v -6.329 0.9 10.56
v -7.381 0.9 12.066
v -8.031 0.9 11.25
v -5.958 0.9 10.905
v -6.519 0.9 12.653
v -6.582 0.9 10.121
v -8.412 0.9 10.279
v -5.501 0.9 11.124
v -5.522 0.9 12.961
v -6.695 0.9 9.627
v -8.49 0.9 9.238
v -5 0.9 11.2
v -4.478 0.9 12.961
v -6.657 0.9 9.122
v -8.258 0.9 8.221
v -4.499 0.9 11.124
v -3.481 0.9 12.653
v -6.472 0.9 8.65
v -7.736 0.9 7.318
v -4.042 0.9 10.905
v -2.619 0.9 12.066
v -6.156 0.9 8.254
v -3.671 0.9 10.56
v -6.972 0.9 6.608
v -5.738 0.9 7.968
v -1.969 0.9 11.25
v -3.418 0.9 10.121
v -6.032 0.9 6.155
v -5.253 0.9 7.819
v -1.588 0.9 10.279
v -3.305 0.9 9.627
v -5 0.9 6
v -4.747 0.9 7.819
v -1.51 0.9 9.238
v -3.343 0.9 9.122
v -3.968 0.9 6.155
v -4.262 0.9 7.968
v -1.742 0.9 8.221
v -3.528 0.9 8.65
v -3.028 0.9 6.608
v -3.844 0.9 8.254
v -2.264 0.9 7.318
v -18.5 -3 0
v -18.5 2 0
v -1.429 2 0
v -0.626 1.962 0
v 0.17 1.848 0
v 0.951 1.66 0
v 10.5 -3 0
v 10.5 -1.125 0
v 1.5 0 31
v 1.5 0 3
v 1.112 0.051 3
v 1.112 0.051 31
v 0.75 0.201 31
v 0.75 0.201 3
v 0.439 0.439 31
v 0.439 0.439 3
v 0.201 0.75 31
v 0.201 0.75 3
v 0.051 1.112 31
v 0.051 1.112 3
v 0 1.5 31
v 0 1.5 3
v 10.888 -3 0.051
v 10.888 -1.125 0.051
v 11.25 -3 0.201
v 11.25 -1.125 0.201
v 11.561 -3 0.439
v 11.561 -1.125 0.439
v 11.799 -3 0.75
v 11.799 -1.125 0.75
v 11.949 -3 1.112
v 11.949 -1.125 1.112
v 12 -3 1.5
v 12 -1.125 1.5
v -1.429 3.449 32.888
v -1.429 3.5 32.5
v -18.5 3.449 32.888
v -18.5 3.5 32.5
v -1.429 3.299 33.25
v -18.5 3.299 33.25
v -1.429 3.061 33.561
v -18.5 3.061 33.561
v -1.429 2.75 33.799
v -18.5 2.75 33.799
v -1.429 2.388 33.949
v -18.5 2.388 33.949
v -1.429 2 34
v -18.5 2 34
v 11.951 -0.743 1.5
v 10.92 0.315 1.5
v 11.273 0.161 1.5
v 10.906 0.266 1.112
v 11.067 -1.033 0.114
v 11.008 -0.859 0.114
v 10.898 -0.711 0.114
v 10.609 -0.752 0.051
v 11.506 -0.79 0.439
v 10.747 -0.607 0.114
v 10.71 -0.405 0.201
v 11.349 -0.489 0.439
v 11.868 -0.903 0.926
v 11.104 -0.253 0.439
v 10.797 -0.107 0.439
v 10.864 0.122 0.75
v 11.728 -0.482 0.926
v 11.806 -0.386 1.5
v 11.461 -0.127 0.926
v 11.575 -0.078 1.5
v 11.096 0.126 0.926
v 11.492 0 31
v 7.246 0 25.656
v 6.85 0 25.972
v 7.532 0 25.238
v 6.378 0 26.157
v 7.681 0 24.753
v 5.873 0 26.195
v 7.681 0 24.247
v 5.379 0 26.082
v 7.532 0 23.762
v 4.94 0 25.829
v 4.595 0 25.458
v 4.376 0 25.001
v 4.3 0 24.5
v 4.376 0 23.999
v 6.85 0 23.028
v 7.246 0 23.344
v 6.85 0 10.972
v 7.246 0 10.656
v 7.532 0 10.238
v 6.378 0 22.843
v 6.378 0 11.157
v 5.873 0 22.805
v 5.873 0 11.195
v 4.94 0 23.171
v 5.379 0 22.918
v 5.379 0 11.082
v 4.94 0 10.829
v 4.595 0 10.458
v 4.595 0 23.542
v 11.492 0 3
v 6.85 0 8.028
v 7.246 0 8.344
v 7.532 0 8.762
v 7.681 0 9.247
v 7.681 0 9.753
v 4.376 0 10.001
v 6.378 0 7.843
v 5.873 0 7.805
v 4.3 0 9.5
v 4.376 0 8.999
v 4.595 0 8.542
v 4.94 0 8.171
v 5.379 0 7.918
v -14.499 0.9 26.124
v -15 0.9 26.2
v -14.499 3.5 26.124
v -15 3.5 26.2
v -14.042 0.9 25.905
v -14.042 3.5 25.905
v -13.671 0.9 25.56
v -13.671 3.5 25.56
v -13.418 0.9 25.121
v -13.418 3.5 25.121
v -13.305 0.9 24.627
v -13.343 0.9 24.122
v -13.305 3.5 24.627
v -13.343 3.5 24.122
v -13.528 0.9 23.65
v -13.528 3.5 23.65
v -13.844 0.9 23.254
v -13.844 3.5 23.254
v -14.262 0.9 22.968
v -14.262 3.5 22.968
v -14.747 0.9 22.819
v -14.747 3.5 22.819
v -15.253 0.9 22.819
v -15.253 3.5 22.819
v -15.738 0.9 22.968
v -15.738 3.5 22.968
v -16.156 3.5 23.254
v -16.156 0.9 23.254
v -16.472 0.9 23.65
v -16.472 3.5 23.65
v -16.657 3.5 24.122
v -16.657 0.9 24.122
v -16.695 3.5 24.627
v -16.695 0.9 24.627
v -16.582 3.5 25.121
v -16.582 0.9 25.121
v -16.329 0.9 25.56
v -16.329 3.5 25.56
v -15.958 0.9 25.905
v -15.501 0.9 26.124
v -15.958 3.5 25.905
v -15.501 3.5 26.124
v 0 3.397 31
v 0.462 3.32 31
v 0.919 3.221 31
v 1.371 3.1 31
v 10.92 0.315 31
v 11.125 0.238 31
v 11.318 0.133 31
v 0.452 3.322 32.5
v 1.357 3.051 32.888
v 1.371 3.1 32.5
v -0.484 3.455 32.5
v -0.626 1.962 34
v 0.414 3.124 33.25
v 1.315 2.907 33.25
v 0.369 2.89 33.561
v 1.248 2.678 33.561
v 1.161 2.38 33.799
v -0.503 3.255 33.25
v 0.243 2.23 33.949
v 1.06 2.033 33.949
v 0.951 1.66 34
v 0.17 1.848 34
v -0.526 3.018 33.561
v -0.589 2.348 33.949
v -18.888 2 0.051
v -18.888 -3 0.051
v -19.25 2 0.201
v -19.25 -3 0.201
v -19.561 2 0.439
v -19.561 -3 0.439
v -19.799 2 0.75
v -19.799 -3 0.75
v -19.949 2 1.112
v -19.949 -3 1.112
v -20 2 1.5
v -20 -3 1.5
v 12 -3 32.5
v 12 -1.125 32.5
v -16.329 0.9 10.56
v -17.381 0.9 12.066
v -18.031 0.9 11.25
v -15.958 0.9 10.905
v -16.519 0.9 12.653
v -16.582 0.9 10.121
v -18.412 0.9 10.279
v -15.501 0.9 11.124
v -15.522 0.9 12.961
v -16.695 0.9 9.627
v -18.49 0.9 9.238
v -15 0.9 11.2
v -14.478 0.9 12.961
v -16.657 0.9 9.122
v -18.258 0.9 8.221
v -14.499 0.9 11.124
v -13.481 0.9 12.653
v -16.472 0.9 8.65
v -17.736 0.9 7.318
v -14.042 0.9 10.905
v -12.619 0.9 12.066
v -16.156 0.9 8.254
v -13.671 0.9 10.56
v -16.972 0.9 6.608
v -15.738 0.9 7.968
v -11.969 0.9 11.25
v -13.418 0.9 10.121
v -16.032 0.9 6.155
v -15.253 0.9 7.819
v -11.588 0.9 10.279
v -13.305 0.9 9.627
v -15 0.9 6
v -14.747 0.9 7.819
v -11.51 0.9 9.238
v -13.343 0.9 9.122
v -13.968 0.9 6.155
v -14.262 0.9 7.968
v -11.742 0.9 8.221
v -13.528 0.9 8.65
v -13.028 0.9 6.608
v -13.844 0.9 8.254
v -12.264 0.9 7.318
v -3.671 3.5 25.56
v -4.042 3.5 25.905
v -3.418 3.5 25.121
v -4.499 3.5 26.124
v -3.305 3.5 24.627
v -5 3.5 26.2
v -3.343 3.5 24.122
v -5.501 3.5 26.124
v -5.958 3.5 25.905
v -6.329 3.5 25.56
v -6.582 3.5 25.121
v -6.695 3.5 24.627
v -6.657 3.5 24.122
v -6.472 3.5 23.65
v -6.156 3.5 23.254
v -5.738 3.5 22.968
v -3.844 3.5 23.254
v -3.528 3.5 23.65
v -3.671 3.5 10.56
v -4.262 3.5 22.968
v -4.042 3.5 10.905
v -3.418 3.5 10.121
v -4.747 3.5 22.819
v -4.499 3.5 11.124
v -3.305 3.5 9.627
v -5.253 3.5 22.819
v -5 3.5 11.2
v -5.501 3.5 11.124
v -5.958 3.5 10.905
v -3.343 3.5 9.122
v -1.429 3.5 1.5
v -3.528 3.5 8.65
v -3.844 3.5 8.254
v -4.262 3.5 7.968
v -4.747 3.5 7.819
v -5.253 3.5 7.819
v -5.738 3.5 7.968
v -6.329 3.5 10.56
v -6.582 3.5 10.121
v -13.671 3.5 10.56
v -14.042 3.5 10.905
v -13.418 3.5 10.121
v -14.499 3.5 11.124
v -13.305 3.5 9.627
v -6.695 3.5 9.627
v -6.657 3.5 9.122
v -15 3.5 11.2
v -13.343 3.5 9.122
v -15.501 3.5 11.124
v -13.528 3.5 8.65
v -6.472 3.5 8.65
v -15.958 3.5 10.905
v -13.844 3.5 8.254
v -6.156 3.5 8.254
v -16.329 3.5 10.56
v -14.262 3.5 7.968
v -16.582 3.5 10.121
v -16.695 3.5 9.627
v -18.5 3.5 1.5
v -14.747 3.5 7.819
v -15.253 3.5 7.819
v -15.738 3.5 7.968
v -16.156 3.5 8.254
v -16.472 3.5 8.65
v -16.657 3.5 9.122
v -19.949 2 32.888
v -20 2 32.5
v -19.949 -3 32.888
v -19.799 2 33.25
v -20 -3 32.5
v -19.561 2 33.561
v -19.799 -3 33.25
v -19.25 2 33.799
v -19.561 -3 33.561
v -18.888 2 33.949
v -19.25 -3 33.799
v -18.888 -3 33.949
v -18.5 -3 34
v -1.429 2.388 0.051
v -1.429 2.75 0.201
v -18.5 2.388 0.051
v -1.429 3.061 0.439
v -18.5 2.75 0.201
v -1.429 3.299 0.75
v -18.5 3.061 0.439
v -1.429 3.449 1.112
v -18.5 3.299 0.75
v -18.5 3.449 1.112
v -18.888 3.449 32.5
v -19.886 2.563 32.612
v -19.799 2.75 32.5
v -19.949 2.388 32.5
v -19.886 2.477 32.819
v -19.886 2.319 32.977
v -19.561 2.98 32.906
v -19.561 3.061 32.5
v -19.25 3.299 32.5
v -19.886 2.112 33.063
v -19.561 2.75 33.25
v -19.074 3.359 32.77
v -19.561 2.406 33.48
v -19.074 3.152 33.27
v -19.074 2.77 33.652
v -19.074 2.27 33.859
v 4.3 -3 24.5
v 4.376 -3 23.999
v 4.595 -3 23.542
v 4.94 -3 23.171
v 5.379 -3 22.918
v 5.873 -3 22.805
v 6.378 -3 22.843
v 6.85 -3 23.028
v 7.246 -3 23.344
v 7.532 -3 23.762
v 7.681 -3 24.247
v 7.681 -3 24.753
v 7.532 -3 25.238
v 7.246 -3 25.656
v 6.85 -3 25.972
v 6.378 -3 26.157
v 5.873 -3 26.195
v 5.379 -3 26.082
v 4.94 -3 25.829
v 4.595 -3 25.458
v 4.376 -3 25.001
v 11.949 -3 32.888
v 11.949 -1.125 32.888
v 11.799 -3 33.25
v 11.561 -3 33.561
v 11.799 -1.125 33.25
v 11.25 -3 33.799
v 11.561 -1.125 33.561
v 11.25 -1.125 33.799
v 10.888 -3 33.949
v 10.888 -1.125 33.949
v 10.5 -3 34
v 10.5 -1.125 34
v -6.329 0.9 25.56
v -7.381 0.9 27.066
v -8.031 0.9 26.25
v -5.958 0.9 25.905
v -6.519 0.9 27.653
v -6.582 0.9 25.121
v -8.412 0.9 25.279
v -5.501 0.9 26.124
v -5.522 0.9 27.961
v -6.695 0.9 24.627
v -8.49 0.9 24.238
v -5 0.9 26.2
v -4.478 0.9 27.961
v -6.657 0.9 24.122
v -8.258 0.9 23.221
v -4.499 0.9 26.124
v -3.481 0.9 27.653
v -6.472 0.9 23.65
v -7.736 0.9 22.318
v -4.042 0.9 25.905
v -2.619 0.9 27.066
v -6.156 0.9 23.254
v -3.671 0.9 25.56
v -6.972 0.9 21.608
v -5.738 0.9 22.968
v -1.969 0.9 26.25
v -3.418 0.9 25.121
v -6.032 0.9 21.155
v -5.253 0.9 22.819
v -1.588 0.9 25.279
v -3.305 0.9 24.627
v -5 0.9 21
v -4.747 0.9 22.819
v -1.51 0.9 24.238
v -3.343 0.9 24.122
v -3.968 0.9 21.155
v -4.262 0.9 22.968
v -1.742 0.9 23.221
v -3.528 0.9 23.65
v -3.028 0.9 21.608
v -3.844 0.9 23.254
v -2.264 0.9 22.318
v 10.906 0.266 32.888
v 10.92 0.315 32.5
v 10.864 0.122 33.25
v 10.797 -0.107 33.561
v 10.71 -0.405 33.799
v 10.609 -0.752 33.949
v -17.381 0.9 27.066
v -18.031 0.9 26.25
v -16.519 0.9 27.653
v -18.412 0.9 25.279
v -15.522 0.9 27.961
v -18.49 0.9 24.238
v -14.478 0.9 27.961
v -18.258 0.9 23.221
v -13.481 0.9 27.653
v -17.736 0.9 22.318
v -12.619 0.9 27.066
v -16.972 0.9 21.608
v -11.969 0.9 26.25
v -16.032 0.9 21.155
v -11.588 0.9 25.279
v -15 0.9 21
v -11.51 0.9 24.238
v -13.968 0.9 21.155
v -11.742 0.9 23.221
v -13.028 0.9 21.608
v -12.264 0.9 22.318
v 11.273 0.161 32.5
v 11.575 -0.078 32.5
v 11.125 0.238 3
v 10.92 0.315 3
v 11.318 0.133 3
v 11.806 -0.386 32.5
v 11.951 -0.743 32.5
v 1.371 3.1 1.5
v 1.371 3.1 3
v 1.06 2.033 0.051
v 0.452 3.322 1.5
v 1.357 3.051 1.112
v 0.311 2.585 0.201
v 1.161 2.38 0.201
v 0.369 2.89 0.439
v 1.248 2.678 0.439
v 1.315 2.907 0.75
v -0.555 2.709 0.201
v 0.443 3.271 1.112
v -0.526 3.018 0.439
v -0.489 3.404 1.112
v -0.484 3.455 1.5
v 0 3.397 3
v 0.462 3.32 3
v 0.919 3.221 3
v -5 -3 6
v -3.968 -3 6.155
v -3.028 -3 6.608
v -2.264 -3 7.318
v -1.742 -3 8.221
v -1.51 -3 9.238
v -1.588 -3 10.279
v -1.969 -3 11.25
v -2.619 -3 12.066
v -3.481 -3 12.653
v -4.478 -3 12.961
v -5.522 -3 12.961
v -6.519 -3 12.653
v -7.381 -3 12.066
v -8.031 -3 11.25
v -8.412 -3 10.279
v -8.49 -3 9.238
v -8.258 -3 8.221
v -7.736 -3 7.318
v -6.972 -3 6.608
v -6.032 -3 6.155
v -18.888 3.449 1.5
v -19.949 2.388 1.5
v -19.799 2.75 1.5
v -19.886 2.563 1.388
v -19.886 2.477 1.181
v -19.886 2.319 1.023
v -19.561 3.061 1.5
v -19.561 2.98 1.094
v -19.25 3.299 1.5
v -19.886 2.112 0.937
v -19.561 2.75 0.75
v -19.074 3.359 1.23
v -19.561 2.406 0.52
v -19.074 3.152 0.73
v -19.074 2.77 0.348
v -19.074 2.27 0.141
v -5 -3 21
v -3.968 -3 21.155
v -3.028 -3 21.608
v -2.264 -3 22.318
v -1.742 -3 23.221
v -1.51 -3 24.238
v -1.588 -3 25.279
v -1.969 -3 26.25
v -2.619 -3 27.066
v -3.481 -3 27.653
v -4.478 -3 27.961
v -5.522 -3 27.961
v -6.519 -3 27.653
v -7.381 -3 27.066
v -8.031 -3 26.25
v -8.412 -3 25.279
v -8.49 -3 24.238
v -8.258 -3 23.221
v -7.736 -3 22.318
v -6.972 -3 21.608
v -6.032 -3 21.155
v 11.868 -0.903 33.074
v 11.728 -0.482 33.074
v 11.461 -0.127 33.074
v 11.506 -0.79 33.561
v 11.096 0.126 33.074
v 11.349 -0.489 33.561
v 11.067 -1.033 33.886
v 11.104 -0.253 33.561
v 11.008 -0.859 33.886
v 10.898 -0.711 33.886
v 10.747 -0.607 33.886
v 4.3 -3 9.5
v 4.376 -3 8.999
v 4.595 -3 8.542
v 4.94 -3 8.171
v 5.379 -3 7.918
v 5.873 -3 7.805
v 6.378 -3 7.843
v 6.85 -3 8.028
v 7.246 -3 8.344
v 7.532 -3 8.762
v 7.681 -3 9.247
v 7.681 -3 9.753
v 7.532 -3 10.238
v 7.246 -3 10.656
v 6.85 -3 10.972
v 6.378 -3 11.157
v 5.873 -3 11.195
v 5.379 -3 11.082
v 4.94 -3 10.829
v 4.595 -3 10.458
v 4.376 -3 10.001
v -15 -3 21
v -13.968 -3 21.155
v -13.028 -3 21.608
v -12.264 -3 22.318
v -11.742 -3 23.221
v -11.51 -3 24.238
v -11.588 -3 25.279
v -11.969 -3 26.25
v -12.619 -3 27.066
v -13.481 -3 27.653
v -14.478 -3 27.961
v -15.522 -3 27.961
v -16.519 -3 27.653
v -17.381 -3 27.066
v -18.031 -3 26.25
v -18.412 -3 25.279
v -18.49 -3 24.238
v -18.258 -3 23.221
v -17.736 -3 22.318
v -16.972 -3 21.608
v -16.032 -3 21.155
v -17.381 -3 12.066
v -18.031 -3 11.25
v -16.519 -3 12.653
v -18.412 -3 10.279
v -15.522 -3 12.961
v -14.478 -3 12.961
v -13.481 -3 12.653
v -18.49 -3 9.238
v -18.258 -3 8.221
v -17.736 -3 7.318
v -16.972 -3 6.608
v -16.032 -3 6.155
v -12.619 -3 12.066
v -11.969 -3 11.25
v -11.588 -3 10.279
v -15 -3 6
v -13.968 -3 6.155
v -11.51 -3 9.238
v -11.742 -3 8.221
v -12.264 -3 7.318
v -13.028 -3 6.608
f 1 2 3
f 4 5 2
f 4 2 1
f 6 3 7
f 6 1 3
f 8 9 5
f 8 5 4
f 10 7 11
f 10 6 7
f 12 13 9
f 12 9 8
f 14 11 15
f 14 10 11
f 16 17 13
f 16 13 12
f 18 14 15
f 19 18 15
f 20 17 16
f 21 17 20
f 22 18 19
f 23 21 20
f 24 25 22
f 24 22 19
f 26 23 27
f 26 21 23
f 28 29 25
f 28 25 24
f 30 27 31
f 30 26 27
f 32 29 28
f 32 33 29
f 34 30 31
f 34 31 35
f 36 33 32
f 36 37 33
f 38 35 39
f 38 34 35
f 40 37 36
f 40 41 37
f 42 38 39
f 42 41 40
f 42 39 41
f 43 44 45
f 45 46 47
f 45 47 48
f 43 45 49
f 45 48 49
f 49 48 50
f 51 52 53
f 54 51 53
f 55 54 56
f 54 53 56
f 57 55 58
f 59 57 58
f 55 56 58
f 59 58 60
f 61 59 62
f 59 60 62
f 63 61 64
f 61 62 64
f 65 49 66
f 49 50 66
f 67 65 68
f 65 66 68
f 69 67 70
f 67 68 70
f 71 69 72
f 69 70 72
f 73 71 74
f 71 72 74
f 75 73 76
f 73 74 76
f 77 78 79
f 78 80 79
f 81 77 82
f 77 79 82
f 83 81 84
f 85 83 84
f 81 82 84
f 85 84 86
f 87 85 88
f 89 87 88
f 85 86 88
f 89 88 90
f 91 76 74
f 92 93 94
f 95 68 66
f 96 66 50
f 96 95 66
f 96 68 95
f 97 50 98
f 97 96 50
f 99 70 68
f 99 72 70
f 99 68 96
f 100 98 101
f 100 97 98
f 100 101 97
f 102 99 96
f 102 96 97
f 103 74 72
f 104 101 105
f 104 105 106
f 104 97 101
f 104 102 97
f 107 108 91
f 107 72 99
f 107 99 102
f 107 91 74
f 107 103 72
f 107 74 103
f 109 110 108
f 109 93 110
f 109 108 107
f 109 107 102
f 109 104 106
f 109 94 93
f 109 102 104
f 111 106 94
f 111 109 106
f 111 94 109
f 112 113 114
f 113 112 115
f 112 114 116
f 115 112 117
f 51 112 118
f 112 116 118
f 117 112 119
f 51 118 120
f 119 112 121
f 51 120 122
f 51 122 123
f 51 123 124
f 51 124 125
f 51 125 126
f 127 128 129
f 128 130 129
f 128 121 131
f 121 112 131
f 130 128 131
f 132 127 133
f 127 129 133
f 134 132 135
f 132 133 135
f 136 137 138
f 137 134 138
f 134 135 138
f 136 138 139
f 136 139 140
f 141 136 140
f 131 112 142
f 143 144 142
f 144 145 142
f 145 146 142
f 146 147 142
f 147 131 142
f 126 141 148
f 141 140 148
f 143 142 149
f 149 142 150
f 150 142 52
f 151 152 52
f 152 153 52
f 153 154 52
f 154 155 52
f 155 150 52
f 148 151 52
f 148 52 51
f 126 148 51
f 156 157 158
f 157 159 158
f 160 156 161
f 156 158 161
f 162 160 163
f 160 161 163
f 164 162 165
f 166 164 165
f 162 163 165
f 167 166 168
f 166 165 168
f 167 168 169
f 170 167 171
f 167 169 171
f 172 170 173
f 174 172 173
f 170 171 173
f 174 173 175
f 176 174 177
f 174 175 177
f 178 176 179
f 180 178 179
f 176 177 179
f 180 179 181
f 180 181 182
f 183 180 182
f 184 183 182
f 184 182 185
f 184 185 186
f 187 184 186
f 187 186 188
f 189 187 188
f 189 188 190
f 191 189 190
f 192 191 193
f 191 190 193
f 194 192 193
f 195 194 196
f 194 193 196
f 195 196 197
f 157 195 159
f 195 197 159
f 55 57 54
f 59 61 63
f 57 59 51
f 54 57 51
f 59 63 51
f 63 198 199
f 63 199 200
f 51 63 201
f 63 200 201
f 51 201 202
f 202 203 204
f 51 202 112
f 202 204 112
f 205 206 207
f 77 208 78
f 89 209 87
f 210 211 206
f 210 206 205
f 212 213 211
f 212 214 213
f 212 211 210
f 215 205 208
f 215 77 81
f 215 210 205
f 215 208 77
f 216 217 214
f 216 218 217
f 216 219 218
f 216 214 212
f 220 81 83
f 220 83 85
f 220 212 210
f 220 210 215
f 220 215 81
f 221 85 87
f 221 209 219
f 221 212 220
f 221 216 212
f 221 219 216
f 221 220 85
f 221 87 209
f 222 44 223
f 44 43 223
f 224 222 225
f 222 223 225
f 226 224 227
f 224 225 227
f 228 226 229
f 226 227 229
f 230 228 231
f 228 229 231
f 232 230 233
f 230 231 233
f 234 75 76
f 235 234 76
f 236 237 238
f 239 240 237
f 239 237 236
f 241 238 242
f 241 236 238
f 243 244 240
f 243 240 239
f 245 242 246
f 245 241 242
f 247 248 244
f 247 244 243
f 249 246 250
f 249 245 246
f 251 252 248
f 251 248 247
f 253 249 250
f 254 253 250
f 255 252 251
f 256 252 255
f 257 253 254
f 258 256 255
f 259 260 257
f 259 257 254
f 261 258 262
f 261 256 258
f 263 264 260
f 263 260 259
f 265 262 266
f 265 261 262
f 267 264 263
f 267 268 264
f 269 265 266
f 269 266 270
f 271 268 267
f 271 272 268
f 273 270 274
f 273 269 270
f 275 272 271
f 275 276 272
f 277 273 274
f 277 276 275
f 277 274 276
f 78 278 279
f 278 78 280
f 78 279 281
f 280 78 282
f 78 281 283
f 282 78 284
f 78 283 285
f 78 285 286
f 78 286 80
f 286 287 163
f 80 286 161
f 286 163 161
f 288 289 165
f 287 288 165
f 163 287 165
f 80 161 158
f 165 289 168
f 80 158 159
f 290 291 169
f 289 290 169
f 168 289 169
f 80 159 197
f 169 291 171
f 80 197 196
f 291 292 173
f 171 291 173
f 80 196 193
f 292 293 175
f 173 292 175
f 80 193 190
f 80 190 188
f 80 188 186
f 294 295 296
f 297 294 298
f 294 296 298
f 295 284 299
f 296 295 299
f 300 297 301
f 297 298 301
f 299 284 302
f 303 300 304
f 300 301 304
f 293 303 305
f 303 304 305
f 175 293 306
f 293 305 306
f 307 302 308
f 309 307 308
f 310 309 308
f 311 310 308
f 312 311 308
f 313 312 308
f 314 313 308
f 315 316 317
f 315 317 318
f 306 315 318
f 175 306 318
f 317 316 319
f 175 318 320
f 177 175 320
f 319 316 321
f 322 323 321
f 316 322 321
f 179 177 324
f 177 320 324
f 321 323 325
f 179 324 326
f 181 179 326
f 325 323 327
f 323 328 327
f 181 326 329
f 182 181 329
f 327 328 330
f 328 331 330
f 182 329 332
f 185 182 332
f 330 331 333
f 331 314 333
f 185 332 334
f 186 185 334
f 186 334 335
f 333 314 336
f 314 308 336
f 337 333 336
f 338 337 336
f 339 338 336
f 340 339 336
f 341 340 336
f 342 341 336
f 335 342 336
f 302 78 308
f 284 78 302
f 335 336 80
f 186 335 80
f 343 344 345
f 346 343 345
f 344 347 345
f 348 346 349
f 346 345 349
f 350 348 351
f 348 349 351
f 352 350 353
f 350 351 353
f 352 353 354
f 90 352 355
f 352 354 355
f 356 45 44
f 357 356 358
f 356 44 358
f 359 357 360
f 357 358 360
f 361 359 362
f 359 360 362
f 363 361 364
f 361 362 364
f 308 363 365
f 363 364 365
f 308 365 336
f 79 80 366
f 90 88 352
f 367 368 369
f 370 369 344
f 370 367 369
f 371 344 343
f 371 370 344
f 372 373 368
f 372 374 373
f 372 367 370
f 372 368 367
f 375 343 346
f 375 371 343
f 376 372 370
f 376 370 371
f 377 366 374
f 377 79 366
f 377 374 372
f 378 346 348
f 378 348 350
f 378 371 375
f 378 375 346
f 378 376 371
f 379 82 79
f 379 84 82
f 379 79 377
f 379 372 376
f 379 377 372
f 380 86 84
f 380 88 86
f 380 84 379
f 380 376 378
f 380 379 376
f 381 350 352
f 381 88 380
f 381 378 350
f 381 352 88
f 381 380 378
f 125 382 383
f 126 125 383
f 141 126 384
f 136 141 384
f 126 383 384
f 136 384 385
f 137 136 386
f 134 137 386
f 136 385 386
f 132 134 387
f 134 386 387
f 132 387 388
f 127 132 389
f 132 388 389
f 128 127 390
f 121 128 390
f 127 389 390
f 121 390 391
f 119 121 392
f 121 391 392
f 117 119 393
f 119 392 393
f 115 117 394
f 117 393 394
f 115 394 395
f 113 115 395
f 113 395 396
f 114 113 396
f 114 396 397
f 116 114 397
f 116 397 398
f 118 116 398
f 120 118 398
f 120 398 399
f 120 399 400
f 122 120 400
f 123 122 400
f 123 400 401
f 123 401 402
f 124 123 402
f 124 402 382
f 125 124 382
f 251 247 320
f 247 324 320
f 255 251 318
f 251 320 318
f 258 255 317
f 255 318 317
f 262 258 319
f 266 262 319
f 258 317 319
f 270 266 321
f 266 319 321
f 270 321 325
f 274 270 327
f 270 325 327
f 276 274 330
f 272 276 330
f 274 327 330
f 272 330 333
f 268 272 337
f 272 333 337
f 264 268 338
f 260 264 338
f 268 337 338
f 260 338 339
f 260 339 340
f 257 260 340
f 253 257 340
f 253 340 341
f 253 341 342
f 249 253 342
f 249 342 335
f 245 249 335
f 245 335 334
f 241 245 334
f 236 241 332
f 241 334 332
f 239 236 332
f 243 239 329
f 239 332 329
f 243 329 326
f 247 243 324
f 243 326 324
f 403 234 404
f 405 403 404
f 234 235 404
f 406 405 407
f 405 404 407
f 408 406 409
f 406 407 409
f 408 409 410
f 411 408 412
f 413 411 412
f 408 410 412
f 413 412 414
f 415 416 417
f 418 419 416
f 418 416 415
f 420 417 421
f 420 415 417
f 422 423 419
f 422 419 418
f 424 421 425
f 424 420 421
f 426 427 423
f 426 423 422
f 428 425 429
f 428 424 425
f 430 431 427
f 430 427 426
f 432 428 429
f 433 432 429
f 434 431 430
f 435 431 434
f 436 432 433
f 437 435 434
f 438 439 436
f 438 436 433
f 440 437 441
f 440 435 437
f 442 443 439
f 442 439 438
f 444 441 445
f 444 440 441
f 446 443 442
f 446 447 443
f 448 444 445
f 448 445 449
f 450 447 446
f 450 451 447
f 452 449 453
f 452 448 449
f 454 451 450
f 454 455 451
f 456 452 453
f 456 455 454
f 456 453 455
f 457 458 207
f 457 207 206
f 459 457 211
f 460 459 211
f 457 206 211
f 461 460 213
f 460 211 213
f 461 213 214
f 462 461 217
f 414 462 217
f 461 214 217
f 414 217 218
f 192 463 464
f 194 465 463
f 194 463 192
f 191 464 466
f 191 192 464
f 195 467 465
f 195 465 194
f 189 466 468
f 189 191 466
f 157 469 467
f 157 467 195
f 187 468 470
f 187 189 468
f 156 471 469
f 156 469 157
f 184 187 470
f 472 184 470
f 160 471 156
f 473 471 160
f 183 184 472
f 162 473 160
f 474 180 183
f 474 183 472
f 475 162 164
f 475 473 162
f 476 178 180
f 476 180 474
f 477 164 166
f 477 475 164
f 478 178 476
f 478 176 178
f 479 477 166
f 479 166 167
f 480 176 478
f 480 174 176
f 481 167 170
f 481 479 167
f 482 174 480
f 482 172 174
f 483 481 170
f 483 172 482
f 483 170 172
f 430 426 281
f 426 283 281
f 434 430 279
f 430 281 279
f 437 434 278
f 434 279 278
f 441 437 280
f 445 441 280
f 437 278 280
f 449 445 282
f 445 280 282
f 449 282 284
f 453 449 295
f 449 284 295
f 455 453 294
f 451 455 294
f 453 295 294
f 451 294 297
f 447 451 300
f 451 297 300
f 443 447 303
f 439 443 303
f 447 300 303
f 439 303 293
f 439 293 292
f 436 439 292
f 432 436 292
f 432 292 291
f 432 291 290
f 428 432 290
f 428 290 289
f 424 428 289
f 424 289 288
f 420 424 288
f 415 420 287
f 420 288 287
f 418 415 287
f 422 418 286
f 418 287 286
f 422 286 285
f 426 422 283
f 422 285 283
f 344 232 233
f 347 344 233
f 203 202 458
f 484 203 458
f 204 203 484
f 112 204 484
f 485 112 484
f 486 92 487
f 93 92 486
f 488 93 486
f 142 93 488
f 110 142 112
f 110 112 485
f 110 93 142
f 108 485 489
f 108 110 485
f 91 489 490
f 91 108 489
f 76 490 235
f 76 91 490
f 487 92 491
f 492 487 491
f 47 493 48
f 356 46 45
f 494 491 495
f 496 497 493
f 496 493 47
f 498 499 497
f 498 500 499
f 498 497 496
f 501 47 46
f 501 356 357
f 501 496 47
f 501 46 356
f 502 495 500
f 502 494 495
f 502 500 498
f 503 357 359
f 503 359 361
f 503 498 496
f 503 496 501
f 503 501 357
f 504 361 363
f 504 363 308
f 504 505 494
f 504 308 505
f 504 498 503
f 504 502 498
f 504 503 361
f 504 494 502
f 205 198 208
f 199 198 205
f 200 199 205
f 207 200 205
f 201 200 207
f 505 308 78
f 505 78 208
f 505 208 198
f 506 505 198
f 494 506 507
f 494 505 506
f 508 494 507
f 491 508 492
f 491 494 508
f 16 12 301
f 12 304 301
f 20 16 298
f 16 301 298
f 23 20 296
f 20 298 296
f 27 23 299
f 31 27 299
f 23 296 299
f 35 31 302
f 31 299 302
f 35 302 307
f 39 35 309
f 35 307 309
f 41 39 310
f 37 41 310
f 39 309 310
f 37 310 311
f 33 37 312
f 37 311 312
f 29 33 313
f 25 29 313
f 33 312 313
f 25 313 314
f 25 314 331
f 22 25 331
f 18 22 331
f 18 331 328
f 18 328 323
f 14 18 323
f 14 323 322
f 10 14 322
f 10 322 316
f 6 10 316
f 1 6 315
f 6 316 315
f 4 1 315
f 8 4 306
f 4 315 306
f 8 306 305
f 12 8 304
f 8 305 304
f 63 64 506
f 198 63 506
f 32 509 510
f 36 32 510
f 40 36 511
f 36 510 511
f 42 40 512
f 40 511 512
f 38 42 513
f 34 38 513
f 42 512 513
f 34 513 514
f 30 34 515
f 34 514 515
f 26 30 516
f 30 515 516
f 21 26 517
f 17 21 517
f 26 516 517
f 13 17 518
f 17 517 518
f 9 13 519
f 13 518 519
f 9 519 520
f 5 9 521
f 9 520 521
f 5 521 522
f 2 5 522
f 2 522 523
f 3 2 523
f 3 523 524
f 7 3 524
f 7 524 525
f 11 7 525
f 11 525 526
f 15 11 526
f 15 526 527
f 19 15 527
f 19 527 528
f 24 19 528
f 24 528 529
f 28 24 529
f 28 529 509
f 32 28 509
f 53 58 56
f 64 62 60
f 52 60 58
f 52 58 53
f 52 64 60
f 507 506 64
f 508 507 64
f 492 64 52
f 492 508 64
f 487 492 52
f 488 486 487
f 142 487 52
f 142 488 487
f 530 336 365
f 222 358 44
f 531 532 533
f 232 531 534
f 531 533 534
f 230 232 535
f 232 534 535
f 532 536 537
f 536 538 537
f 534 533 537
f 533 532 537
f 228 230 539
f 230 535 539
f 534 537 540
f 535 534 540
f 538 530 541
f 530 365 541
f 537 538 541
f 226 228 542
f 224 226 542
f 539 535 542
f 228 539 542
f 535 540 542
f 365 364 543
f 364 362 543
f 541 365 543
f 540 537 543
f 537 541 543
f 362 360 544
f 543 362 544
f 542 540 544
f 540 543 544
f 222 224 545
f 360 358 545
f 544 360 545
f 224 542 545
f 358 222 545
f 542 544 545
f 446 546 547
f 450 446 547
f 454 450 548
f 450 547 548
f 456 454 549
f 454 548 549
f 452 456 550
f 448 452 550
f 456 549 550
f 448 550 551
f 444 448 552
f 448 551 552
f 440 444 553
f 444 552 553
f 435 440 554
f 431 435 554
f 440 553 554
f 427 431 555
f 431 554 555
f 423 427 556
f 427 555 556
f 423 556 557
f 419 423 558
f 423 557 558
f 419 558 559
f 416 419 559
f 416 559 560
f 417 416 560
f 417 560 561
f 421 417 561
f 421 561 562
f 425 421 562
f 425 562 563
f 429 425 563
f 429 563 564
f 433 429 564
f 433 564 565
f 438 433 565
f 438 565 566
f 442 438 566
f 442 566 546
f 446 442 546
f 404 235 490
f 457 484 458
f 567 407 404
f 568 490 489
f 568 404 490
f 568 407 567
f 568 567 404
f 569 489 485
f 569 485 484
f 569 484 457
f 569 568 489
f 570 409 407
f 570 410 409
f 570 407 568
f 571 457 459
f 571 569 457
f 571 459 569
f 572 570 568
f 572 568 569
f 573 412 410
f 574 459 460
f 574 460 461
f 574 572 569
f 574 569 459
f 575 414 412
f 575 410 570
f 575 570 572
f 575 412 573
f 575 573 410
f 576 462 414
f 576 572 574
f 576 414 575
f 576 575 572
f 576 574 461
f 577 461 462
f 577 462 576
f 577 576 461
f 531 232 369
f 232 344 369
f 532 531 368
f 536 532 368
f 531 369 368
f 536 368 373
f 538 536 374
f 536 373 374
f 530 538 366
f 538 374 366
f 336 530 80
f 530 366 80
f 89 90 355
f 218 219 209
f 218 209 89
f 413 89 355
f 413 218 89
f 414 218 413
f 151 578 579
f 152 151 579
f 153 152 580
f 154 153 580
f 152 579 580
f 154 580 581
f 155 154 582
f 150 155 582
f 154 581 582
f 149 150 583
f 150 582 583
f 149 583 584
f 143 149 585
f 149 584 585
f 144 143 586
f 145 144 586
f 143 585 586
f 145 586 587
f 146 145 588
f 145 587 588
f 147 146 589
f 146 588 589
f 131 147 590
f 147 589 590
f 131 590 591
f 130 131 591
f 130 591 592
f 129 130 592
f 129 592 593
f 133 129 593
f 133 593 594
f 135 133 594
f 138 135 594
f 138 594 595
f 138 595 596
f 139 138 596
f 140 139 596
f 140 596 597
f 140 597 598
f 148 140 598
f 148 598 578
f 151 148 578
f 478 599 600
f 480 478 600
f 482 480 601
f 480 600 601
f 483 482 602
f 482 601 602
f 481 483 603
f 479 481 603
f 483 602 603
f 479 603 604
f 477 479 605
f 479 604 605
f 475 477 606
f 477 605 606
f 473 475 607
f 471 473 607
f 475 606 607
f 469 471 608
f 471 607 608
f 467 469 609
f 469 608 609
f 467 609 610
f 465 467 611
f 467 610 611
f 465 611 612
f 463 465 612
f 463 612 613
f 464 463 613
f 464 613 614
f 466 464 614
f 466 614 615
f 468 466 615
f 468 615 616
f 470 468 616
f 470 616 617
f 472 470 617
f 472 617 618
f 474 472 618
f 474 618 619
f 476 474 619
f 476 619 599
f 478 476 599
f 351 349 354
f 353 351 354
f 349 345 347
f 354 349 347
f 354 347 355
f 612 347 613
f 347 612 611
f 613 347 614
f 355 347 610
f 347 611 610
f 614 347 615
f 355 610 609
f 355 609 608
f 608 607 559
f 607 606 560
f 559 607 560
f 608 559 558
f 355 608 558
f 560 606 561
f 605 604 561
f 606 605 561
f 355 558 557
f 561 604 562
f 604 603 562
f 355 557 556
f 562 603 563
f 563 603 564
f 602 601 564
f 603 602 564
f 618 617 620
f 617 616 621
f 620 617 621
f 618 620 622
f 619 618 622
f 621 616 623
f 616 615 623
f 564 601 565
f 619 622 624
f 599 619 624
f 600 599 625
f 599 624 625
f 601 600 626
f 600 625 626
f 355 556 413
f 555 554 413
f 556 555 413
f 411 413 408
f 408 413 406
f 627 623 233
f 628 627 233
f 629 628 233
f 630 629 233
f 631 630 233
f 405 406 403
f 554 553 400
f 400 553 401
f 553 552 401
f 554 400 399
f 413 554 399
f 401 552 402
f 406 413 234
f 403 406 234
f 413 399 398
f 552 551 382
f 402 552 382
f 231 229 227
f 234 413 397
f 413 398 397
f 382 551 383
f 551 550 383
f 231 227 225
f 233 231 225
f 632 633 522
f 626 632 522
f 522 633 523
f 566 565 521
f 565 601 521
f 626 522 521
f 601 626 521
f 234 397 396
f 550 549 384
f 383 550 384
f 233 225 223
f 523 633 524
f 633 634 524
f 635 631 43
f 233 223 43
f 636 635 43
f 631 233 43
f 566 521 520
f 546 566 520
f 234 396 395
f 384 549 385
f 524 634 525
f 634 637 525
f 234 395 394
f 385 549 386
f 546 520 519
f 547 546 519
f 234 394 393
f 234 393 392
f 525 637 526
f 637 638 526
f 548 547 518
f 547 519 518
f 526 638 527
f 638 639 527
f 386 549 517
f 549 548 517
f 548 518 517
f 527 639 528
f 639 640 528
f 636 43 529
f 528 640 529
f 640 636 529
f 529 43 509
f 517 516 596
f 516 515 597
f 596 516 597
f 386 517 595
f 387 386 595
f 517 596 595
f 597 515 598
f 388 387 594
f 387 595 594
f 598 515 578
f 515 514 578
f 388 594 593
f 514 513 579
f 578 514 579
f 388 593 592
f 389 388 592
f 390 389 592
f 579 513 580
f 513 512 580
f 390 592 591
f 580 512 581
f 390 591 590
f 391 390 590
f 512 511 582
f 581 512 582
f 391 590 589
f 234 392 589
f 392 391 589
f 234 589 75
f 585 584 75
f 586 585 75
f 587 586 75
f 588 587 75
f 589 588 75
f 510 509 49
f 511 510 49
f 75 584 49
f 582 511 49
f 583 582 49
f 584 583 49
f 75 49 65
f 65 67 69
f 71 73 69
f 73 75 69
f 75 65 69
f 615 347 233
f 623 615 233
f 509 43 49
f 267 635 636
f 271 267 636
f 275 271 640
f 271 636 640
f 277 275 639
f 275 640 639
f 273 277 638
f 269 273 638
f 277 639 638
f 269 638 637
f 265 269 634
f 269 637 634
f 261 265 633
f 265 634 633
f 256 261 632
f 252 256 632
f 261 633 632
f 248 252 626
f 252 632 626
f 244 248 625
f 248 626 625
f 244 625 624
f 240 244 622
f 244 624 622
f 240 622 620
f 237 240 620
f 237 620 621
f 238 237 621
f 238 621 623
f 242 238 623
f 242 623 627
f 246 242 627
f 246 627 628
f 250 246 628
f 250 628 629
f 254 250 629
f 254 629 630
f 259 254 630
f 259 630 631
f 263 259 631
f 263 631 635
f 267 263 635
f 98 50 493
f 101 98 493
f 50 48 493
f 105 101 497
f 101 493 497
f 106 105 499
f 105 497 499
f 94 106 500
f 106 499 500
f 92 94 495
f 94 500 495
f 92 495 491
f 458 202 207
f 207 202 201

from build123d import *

# Parameters (mm, degrees)
PROFILE_EXTRUDE_DEPTH               = 34
GUSSET_1_EXTRUDE_DEPTH              = 3
GUSSET_START                        = 31
GUSSET_2_EXTRUDE_DEPTH              = 3
SOLENOID_MOUNTING_HOLES_D           = 3.4
SOLENOID_MOUNTING_HOLES_CBORE_D     = 7
SOLENOID_MOUNTING_HOLES_CBORE_DEPTH = 3.9
M3_MOUNTING_HOLES_D                 = 3.4
FRONT_START                         = -1
FRONT_EDGE_FILLETS_DEPTH            = 36
FRONT_EDGE_FILLETS_2_DEPTH          = 34
TOP_START                           = -1
TOP_EDGE_FILLET_DEPTH               = 36
CORNER_FILLETS_R                    = 1.5


with BuildPart() as part:
    # Profile Sketch → Profile  Extrude (new body)
    with BuildSketch(Plane.XY):
        Polygon((0, 0), (0, 3.5), (-20, 3.5), (-20, -3), (12, -3), (12, 0), align=None)
    extrude(amount=PROFILE_EXTRUDE_DEPTH)

    # Gusset Sketch → Gusset 1 Extrude (add)
    with BuildSketch(Plane.XY):
        Polygon((0, 0), (12, 0), (0, 3.5), align=None)
    extrude(amount=GUSSET_1_EXTRUDE_DEPTH)

    # Gusset Sketch<2> → Gusset 2 Extrude (add)
    with BuildSketch(Plane.XY.offset(GUSSET_START)):
        Polygon((0, 0), (12, 0), (0, 3.5), align=None)
    extrude(amount=GUSSET_2_EXTRUDE_DEPTH)

    # Solenoid Mounting Holes (through all)
    with Locations(Plane(origin=(-3, -3, 0), x_dir=(0, 0, -1), z_dir=(0, -1, 0))):
        with Locations((-9.5, -12), (-24.5, -12), (-24.5, -2), (-9.5, -2)):
            CounterBoreHole(SOLENOID_MOUNTING_HOLES_D / 2, SOLENOID_MOUNTING_HOLES_CBORE_D / 2, SOLENOID_MOUNTING_HOLES_CBORE_DEPTH)

    # M3 Mounting Holes (through all)
    with Locations(Plane(origin=(0, 0, 0), x_dir=(1, 0, 0), z_dir=(0, 1, 0))):
        with Locations((6, -24.5), (6, -9.5)):
            Hole(M3_MOUNTING_HOLES_D / 2)

    # Front Edge Fillets: read off the stored shape, not the designer's step
    # Front Edge Fillets outline → Front Edge Fillets (cut)
    with BuildSketch(Plane.XY.offset(FRONT_START)):
        with BuildLine():
            Line((12, -1.125), (12, 0))
            Line((12, 0), (10.92, 0.315))
            ThreePointArc((10.92, 0.315), (11.7, -0.225), (12, -1.125))
        make_face()
    extrude(amount=FRONT_EDGE_FILLETS_DEPTH, mode=Mode.SUBTRACT)

    # Front Edge Fillets 2 outline → Front Edge Fillets 2 (add)
    with BuildSketch(Plane.XY):
        with BuildLine():
            ThreePointArc((1.5, 0), (0.439339828, 0.439339828), (0, 1.5))
            Line((0, 1.5), (0, 0))
            Line((0, 0), (1.5, 0))
        make_face()
    extrude(amount=FRONT_EDGE_FILLETS_2_DEPTH)

    # Top Edge Fillet: read off the stored shape, not the designer's step
    # Top Edge Fillet outline → Top Edge Fillet (cut)
    with BuildSketch(Plane.XY.offset(TOP_START)):
        with BuildLine():
            Line((1.371428571, 3.1), (0, 3.5))
            Line((0, 3.5), (-1.428571429, 3.5))
            ThreePointArc((-1.428571429, 3.5), (-0.014357867, 3.399494937), (1.371428571, 3.1))
        make_face()
    extrude(amount=TOP_EDGE_FILLET_DEPTH, mode=Mode.SUBTRACT)

    # Corner Fillets
    corner_fillets_edges = [part.edges().sort_by_distance(p)[0] for p in [
        (-10.714285714, 3.5, 0),
        (-10.714285714, 3.5, 34),
        (-0.014357867, 3.399494937, 0),
        (-0.014357867, 3.399494937, 34),
        (-20, 3.5, 17),
        (-20, 0.25, 34),
        (12, -2.0625, 34),
        (12, -2.0625, 0),
        (-20, 0.25, 0),
        (6.145714286, 1.7075, 0),
        (11.7, -0.225, 0),
        (6.145714286, 1.7075, 34),
        (11.7, -0.225, 34),
    ]]
    fillet(corner_fillets_edges, radius=CORNER_FILLETS_R)


solid = part.part
